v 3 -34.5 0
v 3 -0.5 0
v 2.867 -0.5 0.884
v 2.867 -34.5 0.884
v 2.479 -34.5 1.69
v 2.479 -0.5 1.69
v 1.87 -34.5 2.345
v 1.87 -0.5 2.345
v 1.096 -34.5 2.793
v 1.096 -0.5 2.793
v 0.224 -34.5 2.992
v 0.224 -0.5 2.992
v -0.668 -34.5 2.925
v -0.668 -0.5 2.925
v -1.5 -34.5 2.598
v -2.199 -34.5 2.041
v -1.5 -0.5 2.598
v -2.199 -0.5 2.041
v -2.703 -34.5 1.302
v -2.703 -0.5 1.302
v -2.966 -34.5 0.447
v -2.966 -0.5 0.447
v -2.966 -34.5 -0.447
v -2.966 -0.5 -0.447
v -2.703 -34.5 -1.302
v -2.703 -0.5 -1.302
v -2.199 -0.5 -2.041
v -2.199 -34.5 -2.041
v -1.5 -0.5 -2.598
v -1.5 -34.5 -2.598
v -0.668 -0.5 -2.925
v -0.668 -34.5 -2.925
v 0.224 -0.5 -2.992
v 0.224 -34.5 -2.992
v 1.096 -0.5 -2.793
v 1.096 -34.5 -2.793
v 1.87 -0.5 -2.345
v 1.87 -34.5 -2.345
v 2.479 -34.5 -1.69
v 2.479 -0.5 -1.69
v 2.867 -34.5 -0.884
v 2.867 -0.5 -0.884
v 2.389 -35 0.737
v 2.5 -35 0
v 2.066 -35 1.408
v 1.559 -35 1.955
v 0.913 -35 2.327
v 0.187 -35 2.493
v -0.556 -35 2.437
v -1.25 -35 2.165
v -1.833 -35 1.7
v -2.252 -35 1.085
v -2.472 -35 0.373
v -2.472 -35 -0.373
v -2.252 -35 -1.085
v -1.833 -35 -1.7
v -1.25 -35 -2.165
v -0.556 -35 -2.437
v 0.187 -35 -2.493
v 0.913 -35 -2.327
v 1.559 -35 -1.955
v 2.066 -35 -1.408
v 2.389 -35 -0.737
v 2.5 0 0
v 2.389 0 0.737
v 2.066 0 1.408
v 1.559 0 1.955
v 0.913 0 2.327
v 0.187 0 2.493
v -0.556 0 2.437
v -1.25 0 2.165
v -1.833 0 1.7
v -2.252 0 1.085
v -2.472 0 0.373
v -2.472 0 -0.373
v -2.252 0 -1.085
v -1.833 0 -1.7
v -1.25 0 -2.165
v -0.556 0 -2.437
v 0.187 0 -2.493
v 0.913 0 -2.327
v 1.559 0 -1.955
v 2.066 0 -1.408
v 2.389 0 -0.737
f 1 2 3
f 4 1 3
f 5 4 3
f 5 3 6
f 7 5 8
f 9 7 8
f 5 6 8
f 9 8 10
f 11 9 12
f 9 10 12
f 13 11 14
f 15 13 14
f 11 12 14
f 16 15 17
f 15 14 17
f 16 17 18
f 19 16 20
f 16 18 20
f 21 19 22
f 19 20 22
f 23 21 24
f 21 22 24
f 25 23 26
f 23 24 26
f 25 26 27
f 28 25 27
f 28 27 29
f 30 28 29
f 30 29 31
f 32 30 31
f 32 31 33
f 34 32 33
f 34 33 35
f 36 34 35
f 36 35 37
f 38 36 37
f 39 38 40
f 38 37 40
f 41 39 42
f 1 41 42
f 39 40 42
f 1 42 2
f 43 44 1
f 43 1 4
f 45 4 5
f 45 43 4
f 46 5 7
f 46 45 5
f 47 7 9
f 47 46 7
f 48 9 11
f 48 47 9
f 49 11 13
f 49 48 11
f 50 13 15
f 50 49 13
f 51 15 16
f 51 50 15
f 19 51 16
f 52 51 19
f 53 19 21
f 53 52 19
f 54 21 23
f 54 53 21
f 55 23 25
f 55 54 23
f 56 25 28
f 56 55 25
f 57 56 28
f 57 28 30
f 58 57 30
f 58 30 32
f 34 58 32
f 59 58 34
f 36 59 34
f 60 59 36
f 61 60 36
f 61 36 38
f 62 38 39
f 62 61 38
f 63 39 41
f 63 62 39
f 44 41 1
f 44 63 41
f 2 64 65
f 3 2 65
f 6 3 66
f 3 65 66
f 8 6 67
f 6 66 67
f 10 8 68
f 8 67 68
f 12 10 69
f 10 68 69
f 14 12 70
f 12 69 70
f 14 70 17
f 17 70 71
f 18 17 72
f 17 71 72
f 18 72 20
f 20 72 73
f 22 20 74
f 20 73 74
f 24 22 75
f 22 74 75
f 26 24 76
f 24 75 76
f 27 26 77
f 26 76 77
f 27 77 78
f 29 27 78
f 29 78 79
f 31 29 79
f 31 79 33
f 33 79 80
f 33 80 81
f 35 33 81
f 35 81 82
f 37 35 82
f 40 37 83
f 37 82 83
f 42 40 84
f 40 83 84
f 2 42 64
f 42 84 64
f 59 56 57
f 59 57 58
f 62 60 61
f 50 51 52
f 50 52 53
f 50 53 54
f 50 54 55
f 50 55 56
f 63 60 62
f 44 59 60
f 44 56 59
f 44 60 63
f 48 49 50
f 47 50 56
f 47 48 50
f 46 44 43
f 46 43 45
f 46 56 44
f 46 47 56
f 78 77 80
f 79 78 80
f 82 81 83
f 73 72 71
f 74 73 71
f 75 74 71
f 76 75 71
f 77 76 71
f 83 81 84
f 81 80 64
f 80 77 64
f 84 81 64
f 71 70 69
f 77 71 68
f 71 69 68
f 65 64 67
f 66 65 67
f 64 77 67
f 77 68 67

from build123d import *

# Parameters (mm, degrees)
F0_R     = 3
F1_DEPTH = 35
F2_SIZE  = 0.5
F3_SIZE  = 0.5


with BuildPart() as f1:
    # F0 (on Front) → F1 (new body)
    with BuildSketch(Plane.XZ):
        Circle(F0_R)
    extrude(amount=F1_DEPTH)

    # F2
    f2_edges = [f1.edges().sort_by_distance(p)[0] for p in [
        (-3, -35, 0),
    ]]
    chamfer(f2_edges, length=F2_SIZE)

    # F3
    f3_edges = [f1.edges().sort_by_distance(p)[0] for p in [
        (-3, 0, 0),
    ]]
    chamfer(f3_edges, length=F3_SIZE)


solid = f1.part
